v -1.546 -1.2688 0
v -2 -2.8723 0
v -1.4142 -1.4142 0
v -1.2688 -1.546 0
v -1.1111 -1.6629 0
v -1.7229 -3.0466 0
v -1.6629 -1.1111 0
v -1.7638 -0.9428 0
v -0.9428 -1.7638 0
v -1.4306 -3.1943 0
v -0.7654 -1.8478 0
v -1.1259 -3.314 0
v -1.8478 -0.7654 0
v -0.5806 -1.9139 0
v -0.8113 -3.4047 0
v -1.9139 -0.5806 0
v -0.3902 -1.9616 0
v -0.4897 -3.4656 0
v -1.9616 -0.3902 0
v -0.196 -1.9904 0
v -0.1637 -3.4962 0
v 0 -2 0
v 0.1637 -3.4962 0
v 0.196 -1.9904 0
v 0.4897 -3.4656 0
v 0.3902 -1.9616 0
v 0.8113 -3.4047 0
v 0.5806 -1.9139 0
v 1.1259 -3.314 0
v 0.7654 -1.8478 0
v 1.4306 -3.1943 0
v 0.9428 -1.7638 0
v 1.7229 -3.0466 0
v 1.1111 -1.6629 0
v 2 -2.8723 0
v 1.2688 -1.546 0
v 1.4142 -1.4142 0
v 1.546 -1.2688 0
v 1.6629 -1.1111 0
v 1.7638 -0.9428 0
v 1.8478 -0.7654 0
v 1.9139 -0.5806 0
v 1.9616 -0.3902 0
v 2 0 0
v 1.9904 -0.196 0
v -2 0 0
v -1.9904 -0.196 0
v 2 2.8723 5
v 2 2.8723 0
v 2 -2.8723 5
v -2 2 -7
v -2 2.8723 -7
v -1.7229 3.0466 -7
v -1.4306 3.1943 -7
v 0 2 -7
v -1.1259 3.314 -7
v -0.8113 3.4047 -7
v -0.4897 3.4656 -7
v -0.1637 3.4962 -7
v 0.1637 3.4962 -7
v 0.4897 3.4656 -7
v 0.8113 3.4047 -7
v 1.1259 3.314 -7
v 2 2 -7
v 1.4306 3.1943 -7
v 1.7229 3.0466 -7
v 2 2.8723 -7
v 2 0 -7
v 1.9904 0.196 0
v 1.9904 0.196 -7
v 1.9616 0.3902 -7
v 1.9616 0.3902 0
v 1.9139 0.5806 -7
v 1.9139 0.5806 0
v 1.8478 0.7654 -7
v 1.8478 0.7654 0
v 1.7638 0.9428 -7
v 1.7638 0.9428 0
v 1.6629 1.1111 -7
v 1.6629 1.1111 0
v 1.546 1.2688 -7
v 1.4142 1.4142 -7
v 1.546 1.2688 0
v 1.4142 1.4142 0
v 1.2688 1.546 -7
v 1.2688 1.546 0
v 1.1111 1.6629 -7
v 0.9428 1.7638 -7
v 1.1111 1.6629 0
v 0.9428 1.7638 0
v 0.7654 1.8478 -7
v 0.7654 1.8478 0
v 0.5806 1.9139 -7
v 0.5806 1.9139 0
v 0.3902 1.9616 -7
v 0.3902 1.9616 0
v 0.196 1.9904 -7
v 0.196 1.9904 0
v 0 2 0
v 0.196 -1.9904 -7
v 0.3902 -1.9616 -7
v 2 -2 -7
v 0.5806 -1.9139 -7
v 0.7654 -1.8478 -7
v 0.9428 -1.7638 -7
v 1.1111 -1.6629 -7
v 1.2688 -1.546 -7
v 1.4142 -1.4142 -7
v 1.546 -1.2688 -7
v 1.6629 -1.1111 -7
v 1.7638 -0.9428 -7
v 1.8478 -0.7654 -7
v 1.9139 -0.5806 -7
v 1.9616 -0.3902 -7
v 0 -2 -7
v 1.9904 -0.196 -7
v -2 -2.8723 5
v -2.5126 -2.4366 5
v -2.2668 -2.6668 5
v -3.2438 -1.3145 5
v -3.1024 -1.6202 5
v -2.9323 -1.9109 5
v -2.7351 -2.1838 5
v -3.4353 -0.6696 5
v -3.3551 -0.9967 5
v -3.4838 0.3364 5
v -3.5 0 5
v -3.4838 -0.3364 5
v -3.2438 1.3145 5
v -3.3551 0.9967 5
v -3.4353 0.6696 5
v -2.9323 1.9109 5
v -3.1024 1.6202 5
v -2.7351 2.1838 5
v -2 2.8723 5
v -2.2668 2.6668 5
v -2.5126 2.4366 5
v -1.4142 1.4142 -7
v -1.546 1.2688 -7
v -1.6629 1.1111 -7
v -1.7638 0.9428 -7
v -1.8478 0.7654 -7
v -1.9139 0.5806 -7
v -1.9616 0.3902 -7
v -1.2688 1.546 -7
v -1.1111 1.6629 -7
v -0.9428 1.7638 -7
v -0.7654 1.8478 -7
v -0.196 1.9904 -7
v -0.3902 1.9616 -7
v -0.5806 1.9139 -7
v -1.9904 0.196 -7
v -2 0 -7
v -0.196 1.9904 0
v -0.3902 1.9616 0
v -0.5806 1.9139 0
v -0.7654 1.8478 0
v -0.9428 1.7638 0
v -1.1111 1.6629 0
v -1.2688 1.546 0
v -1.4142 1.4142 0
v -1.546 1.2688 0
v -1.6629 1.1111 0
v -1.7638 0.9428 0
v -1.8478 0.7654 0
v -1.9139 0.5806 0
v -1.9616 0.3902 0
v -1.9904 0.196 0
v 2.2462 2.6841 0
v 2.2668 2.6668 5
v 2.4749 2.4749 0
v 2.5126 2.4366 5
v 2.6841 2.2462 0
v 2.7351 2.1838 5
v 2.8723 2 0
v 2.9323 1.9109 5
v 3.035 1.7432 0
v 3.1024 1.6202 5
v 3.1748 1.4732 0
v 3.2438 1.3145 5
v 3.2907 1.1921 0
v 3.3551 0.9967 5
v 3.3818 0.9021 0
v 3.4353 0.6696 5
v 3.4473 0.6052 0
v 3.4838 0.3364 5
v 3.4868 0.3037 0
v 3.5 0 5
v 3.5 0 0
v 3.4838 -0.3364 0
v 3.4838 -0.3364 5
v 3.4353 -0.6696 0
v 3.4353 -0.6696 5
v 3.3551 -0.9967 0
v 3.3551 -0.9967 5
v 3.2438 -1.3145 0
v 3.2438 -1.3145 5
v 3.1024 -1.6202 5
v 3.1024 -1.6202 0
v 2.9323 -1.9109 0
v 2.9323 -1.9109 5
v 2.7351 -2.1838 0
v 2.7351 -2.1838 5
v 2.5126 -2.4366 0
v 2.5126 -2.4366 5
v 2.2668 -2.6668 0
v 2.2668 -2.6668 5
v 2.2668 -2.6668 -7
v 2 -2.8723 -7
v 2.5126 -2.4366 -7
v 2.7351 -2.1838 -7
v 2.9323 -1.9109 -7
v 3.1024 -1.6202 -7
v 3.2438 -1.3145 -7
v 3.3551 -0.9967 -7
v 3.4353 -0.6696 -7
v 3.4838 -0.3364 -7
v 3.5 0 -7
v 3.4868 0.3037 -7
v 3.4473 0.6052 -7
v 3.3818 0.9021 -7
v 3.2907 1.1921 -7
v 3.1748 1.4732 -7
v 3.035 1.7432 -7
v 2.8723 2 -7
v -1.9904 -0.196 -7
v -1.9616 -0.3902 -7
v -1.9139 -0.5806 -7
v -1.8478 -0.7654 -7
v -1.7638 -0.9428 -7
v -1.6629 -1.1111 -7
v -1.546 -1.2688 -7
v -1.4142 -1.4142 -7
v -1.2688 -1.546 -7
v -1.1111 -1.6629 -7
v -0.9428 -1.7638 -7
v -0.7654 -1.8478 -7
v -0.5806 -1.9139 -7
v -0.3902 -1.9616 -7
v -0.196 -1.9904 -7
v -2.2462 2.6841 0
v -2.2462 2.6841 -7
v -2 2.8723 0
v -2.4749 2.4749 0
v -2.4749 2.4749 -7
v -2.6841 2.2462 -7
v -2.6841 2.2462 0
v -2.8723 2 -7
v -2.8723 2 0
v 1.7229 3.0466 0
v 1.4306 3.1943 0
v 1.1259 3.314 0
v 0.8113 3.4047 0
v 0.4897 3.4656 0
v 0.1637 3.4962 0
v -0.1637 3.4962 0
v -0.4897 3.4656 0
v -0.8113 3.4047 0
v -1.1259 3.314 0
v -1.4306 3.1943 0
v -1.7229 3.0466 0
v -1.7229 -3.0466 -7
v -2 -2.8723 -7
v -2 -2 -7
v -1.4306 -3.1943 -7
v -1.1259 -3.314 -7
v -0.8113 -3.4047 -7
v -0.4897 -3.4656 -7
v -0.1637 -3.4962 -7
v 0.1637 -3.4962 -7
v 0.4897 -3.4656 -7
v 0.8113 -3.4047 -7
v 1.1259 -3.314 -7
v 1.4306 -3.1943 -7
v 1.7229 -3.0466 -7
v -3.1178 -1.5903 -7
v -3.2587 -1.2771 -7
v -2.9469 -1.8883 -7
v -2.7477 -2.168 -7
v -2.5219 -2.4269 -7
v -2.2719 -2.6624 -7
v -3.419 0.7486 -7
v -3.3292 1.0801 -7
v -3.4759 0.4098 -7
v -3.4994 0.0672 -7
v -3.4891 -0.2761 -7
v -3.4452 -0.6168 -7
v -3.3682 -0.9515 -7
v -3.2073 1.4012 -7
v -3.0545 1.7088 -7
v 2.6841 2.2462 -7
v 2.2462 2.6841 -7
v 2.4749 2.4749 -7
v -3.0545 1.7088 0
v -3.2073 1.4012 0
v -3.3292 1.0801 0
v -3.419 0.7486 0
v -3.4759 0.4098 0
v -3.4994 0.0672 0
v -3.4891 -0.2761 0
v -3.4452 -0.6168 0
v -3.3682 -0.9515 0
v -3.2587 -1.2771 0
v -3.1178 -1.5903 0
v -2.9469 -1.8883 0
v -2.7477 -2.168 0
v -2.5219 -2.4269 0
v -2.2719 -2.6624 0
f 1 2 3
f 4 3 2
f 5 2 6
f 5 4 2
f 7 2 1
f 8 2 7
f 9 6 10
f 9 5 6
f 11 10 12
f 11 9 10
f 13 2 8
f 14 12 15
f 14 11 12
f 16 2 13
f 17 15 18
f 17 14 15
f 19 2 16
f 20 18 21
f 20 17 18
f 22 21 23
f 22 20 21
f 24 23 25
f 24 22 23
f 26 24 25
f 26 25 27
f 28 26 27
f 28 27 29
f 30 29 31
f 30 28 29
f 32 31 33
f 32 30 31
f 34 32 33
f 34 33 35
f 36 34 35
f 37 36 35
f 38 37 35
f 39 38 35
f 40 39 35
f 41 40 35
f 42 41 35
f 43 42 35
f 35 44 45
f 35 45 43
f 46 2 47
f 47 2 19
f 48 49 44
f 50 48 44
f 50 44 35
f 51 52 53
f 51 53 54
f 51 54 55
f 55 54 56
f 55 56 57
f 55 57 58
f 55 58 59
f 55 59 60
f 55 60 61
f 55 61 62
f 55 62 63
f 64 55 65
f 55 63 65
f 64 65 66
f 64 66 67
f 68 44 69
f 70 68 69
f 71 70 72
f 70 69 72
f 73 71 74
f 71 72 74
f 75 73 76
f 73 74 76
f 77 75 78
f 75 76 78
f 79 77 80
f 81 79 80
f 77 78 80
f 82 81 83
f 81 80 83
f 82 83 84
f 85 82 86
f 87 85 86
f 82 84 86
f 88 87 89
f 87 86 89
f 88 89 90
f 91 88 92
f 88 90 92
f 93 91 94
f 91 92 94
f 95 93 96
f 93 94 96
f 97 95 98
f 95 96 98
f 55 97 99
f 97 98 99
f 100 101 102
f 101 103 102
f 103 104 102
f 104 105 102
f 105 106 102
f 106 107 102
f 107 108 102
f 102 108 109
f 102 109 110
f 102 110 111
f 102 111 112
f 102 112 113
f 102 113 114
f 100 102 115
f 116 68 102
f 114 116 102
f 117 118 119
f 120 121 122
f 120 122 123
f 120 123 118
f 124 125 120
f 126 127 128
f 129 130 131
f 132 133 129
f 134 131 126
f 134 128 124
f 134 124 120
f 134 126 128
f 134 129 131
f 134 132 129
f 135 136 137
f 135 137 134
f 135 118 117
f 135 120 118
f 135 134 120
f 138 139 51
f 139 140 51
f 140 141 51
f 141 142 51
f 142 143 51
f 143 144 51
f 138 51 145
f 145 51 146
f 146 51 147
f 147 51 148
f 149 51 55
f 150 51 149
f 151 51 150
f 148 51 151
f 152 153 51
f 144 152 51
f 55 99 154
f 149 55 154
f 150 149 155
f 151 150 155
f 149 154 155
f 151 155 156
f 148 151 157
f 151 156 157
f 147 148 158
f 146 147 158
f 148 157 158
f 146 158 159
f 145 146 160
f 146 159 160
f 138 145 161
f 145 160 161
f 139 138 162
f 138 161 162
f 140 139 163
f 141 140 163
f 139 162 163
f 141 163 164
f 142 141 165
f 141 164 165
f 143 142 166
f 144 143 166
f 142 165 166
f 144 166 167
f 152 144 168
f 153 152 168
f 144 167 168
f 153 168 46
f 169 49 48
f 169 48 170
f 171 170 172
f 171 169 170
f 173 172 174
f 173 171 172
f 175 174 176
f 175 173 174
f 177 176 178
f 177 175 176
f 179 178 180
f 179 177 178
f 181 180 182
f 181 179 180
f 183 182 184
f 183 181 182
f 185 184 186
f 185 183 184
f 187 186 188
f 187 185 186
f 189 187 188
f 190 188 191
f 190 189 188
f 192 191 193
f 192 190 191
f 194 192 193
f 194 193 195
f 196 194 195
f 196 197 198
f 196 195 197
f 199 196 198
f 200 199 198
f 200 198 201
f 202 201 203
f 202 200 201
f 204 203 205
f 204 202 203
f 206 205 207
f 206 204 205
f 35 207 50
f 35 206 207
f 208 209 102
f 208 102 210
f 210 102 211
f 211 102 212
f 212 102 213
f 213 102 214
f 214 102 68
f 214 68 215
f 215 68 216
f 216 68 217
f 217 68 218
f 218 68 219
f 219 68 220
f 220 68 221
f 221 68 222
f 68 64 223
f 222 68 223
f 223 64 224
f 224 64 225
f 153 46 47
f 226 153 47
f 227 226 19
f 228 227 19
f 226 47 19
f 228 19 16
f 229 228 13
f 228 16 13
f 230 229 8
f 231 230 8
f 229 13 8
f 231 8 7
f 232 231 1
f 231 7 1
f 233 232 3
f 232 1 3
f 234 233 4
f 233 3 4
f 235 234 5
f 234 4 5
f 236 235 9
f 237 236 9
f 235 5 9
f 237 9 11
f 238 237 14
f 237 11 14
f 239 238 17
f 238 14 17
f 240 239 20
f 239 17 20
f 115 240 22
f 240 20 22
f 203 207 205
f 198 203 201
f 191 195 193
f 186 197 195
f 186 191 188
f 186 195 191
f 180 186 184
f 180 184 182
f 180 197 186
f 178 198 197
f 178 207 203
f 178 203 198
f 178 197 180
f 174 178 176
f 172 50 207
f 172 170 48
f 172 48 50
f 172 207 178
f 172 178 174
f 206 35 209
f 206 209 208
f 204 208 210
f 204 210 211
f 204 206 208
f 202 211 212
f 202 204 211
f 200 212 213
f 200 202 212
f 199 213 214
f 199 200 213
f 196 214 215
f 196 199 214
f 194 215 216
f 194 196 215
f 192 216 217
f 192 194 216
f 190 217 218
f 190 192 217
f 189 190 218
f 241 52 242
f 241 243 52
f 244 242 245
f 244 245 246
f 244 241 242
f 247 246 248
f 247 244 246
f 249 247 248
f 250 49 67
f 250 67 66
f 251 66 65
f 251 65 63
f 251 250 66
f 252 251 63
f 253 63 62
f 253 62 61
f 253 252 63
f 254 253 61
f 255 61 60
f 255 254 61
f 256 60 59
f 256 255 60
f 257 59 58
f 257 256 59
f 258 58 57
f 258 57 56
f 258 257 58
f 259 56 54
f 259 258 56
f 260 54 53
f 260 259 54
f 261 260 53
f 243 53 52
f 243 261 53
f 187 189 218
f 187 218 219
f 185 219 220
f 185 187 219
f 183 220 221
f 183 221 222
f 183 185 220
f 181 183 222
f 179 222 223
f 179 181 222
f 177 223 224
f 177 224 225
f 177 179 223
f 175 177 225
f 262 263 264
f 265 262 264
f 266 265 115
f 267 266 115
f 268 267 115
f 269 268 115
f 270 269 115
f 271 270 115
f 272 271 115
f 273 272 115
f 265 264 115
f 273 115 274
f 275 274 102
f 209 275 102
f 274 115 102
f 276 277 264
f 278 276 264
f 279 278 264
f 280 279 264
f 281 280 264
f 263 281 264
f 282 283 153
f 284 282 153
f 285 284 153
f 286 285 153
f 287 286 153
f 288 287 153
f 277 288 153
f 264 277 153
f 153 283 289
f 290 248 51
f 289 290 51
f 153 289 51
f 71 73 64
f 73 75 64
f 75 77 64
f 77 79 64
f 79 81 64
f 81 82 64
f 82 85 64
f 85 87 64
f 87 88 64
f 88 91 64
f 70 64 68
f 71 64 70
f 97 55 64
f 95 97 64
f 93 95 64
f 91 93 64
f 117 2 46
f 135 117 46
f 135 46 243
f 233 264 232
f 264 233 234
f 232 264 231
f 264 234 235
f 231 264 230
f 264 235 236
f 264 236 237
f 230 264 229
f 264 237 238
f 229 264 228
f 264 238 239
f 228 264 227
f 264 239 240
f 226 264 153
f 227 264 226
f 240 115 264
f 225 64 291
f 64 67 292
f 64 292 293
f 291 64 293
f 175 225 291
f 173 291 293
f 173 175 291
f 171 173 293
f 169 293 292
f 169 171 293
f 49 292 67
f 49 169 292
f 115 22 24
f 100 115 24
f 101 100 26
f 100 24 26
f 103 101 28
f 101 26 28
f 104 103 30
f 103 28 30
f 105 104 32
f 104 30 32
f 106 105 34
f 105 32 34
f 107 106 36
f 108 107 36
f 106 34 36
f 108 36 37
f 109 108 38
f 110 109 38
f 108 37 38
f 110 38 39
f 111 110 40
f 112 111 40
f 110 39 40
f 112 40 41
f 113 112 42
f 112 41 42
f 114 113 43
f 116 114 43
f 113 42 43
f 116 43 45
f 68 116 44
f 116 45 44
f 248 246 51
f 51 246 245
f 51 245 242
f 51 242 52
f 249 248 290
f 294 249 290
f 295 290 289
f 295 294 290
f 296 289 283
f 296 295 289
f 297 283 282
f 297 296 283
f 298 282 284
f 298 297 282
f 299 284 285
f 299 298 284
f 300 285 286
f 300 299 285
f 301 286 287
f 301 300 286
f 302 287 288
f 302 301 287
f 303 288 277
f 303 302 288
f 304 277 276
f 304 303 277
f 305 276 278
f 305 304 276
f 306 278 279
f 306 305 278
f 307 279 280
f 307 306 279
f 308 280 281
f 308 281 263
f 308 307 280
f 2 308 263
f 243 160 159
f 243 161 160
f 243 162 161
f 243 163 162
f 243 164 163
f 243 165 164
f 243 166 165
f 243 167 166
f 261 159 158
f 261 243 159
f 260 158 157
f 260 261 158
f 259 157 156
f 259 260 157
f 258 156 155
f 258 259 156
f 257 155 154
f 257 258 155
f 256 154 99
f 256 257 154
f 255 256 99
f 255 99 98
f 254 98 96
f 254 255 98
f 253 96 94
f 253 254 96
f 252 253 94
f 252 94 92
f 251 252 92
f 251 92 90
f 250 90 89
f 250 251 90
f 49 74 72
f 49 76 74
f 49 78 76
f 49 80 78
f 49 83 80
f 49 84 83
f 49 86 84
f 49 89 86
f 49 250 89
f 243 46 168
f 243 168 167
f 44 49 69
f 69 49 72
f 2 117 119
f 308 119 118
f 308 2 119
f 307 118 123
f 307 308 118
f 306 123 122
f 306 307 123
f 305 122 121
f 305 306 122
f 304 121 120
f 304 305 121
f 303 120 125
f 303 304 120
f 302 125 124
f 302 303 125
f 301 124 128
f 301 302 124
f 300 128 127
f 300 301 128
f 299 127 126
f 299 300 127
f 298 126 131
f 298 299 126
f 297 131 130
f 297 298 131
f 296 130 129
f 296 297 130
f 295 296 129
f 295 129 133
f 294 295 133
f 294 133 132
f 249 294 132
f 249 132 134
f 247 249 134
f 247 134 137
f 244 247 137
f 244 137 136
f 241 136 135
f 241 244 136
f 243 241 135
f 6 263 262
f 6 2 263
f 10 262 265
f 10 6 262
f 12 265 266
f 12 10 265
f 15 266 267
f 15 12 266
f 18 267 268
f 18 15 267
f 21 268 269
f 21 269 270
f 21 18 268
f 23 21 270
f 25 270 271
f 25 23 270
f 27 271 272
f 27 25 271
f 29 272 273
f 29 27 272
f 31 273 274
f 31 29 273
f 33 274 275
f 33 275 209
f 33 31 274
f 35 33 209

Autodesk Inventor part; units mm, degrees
ref_plane "YZ Plane" through (0, 0, 0) normal (1, 0, 0) x (0, 1, 0)
ref_plane "XZ Plane" through (0, 0, 0) normal (0, 1, 0) x (-1, 0, 0)
ref_plane "XY Plane" through (0, 0, 0) normal (0, 0, 1) x (1, 0, 0)
sketch "Sketch1" plane through (0, 0, 0) normal (0, 0, 1) x (1, 0, 0)
  circle A0 centre (0, 0) radius 2
  circle A1 centre (0, 0) radius 3.5
  line L0 (2, 2.8723) -> (2, -2.8723)
  line L1 (2, -2) -> (-2, -2)
  line L2 (-2, -2.8723) -> (-2, 2.8723)
  line L3 (-2.8723, 2) -> (2.8723, 2)
  dimension "d0" = 4
  dimension "d1" = 7
extrude "Extrusion1" add sketch "Sketch1" along normal blind 5 contours L0 L3 A1 | L0 A1 L3 | L2 A1 L3 | L3 A1 L2
extrude "Extrusion2" add sketch "Sketch1" against normal blind 7 contours L0 L1 A0 | L0 L3 A1 | A0 L3 L0 | A0 L2 L3 | L3 L2 A1 L0 | L1 L2 A0 | L1 L0 A1 L2 | L0 A1 L3 | L2 A1 L3 | L3 A1 L2
